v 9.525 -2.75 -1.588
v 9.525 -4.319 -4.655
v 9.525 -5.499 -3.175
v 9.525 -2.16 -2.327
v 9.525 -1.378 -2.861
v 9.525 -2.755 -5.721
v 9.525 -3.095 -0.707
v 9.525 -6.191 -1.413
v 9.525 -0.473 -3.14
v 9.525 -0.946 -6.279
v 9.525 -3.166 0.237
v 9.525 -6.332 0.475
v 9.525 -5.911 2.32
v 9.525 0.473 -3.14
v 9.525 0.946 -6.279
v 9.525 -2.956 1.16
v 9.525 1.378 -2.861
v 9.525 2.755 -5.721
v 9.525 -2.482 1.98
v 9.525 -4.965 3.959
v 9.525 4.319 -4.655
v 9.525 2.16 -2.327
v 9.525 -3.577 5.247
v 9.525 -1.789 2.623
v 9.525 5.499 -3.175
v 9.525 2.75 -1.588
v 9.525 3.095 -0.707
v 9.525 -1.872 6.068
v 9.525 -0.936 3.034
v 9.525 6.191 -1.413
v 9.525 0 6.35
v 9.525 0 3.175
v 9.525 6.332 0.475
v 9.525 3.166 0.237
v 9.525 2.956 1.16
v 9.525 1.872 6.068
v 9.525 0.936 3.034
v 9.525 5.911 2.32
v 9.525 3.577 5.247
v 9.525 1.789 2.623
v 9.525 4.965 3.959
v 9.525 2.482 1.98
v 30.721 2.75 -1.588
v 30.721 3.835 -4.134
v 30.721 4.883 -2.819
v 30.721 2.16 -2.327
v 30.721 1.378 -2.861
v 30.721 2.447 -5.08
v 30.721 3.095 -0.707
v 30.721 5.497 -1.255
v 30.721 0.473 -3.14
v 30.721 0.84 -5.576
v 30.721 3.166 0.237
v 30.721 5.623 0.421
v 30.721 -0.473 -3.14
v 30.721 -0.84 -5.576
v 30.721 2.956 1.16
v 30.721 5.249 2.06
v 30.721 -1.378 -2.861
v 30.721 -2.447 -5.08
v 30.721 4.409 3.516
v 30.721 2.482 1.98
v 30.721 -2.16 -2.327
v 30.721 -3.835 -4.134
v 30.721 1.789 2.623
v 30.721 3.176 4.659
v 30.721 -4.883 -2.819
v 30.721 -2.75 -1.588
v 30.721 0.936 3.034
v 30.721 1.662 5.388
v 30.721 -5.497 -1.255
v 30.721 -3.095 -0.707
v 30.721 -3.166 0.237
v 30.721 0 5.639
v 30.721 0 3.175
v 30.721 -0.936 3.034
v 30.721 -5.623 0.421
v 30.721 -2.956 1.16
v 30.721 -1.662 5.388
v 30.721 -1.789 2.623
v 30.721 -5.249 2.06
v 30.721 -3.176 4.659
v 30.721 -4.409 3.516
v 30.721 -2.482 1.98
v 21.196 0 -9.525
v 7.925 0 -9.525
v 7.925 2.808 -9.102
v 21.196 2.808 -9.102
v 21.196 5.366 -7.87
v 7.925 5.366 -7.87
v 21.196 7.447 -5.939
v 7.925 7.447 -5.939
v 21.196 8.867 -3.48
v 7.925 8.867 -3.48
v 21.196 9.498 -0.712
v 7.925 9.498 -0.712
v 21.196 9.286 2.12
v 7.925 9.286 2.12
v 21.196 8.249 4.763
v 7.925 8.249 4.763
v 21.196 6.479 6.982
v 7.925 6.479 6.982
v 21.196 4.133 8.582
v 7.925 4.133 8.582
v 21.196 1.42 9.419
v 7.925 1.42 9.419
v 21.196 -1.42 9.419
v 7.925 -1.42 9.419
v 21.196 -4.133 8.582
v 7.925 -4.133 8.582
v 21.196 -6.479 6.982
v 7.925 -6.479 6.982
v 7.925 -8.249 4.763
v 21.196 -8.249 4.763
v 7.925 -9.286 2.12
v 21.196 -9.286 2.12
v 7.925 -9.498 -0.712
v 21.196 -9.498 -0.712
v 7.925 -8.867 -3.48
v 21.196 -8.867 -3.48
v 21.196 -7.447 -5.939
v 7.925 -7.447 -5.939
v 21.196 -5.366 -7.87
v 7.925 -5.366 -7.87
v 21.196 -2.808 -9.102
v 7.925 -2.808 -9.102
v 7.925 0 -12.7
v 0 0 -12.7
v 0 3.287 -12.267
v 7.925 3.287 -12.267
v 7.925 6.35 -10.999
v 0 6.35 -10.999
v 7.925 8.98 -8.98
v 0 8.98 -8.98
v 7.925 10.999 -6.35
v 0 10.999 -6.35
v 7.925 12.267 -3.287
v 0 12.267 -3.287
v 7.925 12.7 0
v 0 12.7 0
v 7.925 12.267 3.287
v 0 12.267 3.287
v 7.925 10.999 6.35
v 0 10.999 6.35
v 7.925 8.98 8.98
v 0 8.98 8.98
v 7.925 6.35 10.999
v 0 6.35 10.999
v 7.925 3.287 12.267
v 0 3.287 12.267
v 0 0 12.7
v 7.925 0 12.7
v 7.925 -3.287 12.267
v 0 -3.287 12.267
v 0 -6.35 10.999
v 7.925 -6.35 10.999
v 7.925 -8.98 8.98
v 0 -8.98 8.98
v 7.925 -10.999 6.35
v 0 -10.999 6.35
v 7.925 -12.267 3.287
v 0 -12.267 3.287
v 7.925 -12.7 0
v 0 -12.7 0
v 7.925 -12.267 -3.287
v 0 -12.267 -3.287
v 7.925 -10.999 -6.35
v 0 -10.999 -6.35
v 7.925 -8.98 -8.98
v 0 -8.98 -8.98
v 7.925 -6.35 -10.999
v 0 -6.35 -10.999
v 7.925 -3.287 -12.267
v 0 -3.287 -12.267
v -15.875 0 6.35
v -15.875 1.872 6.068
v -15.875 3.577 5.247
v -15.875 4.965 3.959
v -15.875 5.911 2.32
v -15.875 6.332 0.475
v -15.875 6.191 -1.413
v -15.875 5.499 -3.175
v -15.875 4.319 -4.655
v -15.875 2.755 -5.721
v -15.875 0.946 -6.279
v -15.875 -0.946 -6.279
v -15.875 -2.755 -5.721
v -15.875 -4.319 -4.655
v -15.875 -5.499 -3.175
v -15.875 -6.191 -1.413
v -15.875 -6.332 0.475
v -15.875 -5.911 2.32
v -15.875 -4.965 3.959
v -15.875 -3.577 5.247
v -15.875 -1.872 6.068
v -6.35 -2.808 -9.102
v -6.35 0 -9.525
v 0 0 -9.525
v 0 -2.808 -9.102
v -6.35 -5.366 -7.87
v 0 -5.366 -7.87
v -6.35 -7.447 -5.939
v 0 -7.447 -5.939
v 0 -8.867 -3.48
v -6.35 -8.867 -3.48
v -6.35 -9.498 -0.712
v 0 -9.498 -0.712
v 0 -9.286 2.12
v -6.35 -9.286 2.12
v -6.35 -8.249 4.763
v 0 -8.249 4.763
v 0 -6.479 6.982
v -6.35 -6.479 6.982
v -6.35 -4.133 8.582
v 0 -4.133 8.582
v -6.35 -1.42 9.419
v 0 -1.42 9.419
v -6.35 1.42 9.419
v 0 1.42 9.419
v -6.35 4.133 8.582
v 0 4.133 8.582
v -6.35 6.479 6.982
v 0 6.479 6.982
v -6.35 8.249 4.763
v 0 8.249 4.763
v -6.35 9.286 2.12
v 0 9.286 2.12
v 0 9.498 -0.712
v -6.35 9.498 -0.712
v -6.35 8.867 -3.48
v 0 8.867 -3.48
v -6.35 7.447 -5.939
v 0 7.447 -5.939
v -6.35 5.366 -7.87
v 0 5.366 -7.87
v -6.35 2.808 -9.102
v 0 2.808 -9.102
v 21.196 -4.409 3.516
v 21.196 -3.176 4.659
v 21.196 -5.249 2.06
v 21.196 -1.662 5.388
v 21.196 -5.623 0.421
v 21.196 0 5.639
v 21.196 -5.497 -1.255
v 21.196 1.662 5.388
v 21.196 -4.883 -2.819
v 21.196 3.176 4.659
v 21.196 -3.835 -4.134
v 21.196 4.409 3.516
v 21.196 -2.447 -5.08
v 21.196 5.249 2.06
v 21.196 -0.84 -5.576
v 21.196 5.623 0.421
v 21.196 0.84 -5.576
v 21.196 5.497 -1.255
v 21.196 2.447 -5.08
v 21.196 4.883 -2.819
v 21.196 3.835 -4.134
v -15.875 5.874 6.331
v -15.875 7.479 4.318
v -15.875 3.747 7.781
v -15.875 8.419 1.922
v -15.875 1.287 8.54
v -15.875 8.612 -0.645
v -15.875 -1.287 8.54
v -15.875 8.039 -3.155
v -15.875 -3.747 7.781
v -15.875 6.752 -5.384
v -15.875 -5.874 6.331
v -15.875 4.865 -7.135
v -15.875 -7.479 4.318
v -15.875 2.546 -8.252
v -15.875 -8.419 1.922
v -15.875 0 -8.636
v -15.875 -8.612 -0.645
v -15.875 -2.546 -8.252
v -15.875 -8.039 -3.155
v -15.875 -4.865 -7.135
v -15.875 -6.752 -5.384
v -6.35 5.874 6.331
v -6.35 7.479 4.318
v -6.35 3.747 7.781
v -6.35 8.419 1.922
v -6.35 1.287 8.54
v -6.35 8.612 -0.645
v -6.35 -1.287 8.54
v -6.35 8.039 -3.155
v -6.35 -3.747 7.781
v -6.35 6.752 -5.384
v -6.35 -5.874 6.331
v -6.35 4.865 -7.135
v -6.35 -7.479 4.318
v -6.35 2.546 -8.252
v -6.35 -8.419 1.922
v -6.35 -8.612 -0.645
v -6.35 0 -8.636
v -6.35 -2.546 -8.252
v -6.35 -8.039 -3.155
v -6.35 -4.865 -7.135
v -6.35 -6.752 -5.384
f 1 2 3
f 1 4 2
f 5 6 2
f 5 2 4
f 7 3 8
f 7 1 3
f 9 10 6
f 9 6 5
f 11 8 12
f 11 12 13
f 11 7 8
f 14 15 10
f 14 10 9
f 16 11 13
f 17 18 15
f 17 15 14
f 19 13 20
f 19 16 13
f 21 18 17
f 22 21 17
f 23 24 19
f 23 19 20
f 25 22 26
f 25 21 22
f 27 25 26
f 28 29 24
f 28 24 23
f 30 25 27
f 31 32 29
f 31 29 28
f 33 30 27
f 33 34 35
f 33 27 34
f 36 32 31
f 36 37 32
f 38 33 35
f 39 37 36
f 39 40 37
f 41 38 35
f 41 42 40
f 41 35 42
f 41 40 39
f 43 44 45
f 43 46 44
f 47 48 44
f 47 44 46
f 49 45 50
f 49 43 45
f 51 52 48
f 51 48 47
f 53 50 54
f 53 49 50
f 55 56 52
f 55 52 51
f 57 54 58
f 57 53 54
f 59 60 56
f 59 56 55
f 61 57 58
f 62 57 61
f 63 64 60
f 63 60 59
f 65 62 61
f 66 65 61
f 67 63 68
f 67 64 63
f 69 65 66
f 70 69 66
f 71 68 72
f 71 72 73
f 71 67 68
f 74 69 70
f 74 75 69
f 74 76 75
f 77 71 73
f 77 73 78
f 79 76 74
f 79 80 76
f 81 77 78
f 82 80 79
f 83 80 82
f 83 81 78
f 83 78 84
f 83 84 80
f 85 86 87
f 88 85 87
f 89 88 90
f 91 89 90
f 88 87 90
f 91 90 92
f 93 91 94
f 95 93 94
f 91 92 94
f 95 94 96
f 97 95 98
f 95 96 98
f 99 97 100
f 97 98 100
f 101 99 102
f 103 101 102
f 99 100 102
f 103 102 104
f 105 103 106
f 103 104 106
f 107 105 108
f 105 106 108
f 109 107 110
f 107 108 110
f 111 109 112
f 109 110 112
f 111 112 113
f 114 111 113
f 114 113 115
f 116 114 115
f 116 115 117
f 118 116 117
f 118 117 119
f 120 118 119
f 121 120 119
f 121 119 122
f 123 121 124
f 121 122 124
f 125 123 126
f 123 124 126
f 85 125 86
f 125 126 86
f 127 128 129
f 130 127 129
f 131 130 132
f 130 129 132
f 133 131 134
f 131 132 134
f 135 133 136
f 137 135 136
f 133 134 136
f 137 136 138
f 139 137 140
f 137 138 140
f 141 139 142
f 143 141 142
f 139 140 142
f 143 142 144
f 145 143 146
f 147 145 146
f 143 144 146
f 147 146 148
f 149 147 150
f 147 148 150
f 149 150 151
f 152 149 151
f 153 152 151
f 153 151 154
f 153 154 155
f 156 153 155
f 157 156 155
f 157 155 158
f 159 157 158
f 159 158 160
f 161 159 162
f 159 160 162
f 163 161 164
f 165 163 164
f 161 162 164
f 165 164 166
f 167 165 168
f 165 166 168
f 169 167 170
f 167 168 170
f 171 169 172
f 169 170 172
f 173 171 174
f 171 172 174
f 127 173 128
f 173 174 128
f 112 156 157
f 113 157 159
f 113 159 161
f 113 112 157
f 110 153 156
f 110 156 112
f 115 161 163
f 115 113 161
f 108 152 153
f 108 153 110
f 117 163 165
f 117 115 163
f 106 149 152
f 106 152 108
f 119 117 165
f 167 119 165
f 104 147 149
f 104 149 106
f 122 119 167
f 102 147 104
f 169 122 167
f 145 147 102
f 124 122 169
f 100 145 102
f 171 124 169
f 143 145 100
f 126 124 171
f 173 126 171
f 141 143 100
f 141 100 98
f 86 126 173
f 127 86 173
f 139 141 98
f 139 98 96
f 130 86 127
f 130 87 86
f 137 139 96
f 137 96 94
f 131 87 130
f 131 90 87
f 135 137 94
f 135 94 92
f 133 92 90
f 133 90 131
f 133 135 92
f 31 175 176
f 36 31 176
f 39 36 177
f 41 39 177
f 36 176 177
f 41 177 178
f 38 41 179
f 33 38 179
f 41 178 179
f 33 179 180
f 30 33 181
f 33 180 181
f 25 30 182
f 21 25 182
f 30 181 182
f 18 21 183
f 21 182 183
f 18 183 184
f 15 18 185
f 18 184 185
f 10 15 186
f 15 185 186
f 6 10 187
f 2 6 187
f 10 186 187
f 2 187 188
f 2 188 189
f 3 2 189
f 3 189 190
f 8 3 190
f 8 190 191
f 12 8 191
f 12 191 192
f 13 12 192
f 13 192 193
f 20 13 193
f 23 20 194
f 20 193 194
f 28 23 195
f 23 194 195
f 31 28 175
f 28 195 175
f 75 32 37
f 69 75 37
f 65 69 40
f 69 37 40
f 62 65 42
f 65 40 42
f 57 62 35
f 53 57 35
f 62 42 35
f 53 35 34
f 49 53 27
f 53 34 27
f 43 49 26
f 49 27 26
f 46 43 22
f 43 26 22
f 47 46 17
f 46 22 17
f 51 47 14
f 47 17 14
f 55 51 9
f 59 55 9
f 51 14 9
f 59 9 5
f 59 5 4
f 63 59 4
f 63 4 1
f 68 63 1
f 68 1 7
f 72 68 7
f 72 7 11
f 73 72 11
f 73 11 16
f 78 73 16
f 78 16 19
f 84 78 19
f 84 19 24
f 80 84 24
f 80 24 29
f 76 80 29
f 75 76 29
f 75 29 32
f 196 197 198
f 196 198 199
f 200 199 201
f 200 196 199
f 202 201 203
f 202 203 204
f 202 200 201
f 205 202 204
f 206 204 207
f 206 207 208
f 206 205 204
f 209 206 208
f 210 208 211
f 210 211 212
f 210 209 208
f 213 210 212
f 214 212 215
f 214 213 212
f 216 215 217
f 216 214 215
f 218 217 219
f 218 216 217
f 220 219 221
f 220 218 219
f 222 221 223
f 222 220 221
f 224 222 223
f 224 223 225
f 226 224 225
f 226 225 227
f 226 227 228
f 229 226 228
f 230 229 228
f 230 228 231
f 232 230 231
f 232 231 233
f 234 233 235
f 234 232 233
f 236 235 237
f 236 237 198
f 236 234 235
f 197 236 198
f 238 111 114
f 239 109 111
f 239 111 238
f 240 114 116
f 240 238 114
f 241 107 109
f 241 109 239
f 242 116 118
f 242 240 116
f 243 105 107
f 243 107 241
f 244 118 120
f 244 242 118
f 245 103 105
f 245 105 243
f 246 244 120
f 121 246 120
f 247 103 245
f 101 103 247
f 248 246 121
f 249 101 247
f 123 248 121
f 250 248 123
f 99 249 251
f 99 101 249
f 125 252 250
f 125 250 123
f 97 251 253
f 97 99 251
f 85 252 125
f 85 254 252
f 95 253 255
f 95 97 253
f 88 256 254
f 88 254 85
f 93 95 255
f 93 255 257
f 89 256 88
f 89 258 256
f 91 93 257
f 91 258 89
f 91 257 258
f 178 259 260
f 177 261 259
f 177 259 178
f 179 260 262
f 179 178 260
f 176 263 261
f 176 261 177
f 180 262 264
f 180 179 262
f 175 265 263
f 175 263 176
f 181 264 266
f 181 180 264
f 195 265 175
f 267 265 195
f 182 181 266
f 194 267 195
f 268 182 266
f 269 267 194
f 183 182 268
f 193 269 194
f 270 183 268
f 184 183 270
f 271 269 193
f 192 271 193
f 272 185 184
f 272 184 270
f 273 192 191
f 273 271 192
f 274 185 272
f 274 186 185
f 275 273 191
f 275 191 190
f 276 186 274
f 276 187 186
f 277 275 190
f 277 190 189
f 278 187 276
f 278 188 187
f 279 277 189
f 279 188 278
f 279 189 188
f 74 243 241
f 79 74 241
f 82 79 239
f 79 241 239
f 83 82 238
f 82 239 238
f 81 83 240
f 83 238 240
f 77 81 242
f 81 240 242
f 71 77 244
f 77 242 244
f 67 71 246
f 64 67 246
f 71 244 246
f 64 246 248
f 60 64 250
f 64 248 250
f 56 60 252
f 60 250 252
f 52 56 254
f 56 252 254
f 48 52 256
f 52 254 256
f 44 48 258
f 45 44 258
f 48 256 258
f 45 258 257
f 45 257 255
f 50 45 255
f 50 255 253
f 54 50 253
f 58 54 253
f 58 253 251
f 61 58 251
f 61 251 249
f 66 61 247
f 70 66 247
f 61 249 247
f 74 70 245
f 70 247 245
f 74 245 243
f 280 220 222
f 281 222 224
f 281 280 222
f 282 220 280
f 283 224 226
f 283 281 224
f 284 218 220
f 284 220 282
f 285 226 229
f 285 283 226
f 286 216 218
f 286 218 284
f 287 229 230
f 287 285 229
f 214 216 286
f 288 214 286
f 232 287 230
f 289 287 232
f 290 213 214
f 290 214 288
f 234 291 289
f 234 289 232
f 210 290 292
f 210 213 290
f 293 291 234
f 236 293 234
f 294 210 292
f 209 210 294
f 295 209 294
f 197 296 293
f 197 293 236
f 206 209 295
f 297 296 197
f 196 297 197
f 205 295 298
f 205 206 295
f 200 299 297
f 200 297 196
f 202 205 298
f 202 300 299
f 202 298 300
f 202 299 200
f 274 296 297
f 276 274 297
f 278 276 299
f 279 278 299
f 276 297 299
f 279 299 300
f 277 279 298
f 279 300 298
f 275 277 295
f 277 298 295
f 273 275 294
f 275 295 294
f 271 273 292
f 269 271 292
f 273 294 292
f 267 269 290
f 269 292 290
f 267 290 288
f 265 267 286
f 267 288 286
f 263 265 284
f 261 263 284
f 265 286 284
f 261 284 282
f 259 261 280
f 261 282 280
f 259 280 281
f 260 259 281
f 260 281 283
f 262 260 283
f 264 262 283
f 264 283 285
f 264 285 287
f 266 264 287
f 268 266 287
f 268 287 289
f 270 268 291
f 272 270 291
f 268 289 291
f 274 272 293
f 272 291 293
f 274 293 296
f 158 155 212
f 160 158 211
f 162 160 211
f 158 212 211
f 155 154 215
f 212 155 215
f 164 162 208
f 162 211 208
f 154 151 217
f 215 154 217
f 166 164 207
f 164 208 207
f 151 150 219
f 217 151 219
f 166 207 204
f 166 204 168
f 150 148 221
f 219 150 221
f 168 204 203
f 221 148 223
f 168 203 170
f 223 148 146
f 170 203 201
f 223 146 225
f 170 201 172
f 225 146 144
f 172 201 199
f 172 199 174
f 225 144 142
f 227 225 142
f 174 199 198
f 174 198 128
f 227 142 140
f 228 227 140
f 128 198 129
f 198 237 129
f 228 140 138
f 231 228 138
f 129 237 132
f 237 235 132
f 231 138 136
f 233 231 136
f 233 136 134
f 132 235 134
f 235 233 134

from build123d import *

# Parameters (mm, degrees)
SKETCH1_R           = 12.7
BOSS_EXTRUDE1_DEPTH = 7.9248
SKETCH2_R           = 9.525
BOSS_EXTRUDE2_DEPTH = 13.2715
SKETCH3_R           = 5.6388
BOSS_EXTRUDE3_DEPTH = 9.525
BOSS_EXTRUDE4_START = 6.35
SKETCH4_R           = 9.525
BOSS_EXTRUDE4_DEPTH = 6.35
SKETCH5_R           = 8.636
BOSS_EXTRUDE5_DEPTH = 9.525
SKETCH6_R           = 6.35
CUT_EXTRUDE1_DEPTH  = 25.4
SKETCH7_R           = 3.175
CUT_EXTRUDE2_DEPTH  = 32.108519733


with BuildPart() as part:
    # Sketch1 → Boss-Extrude1 (new body)
    with BuildSketch(Plane(origin=(0, 0, 0), x_dir=(0, 0, -1), z_dir=(1, 0, 0))):
        Circle(SKETCH1_R)
    extrude(amount=BOSS_EXTRUDE1_DEPTH)

    # Sketch2 → Boss-Extrude2 (add)
    with BuildSketch(Plane(origin=(7.9248, 0, 0), x_dir=(0, 0, -1), z_dir=(1, 0, 0))):
        Circle(SKETCH2_R)
    extrude(amount=BOSS_EXTRUDE2_DEPTH)

    # Sketch3 → Boss-Extrude3 (add)
    with BuildSketch(Plane(origin=(21.1963, 0, 0), x_dir=(0, 0, -1), z_dir=(1, 0, 0))):
        with Locations(Location((0, 0, 0), (0, 0, 180))):
            Circle(SKETCH3_R)
    extrude(amount=BOSS_EXTRUDE3_DEPTH)

    # Sketch4 → Boss-Extrude4 (add)
    with BuildSketch(Plane.ZY.offset(BOSS_EXTRUDE4_START)):
        with Locations(Location((0, 0, 0), (0, 0, 180))):
            Circle(SKETCH4_R)
    extrude(amount=-BOSS_EXTRUDE4_DEPTH)

    # Sketch5 → Boss-Extrude5 (add)
    with BuildSketch(Plane.ZY.offset(6.35)):
        with Locations(Location((0, 0, 0), (0, 0, 180))):
            Circle(SKETCH5_R)
    extrude(amount=BOSS_EXTRUDE5_DEPTH)

    # Sketch6 → Cut-Extrude1 (cut)
    with BuildSketch(Plane.ZY.offset(15.875)):
        Circle(SKETCH6_R)
    extrude(amount=-CUT_EXTRUDE1_DEPTH, mode=Mode.SUBTRACT)

    # Sketch7 → Cut-Extrude2 (cut, through all)
    with BuildSketch(Plane.ZY.offset(-9.525)):
        Circle(SKETCH7_R)
    extrude(amount=-CUT_EXTRUDE2_DEPTH, mode=Mode.SUBTRACT)


solid = part.part
